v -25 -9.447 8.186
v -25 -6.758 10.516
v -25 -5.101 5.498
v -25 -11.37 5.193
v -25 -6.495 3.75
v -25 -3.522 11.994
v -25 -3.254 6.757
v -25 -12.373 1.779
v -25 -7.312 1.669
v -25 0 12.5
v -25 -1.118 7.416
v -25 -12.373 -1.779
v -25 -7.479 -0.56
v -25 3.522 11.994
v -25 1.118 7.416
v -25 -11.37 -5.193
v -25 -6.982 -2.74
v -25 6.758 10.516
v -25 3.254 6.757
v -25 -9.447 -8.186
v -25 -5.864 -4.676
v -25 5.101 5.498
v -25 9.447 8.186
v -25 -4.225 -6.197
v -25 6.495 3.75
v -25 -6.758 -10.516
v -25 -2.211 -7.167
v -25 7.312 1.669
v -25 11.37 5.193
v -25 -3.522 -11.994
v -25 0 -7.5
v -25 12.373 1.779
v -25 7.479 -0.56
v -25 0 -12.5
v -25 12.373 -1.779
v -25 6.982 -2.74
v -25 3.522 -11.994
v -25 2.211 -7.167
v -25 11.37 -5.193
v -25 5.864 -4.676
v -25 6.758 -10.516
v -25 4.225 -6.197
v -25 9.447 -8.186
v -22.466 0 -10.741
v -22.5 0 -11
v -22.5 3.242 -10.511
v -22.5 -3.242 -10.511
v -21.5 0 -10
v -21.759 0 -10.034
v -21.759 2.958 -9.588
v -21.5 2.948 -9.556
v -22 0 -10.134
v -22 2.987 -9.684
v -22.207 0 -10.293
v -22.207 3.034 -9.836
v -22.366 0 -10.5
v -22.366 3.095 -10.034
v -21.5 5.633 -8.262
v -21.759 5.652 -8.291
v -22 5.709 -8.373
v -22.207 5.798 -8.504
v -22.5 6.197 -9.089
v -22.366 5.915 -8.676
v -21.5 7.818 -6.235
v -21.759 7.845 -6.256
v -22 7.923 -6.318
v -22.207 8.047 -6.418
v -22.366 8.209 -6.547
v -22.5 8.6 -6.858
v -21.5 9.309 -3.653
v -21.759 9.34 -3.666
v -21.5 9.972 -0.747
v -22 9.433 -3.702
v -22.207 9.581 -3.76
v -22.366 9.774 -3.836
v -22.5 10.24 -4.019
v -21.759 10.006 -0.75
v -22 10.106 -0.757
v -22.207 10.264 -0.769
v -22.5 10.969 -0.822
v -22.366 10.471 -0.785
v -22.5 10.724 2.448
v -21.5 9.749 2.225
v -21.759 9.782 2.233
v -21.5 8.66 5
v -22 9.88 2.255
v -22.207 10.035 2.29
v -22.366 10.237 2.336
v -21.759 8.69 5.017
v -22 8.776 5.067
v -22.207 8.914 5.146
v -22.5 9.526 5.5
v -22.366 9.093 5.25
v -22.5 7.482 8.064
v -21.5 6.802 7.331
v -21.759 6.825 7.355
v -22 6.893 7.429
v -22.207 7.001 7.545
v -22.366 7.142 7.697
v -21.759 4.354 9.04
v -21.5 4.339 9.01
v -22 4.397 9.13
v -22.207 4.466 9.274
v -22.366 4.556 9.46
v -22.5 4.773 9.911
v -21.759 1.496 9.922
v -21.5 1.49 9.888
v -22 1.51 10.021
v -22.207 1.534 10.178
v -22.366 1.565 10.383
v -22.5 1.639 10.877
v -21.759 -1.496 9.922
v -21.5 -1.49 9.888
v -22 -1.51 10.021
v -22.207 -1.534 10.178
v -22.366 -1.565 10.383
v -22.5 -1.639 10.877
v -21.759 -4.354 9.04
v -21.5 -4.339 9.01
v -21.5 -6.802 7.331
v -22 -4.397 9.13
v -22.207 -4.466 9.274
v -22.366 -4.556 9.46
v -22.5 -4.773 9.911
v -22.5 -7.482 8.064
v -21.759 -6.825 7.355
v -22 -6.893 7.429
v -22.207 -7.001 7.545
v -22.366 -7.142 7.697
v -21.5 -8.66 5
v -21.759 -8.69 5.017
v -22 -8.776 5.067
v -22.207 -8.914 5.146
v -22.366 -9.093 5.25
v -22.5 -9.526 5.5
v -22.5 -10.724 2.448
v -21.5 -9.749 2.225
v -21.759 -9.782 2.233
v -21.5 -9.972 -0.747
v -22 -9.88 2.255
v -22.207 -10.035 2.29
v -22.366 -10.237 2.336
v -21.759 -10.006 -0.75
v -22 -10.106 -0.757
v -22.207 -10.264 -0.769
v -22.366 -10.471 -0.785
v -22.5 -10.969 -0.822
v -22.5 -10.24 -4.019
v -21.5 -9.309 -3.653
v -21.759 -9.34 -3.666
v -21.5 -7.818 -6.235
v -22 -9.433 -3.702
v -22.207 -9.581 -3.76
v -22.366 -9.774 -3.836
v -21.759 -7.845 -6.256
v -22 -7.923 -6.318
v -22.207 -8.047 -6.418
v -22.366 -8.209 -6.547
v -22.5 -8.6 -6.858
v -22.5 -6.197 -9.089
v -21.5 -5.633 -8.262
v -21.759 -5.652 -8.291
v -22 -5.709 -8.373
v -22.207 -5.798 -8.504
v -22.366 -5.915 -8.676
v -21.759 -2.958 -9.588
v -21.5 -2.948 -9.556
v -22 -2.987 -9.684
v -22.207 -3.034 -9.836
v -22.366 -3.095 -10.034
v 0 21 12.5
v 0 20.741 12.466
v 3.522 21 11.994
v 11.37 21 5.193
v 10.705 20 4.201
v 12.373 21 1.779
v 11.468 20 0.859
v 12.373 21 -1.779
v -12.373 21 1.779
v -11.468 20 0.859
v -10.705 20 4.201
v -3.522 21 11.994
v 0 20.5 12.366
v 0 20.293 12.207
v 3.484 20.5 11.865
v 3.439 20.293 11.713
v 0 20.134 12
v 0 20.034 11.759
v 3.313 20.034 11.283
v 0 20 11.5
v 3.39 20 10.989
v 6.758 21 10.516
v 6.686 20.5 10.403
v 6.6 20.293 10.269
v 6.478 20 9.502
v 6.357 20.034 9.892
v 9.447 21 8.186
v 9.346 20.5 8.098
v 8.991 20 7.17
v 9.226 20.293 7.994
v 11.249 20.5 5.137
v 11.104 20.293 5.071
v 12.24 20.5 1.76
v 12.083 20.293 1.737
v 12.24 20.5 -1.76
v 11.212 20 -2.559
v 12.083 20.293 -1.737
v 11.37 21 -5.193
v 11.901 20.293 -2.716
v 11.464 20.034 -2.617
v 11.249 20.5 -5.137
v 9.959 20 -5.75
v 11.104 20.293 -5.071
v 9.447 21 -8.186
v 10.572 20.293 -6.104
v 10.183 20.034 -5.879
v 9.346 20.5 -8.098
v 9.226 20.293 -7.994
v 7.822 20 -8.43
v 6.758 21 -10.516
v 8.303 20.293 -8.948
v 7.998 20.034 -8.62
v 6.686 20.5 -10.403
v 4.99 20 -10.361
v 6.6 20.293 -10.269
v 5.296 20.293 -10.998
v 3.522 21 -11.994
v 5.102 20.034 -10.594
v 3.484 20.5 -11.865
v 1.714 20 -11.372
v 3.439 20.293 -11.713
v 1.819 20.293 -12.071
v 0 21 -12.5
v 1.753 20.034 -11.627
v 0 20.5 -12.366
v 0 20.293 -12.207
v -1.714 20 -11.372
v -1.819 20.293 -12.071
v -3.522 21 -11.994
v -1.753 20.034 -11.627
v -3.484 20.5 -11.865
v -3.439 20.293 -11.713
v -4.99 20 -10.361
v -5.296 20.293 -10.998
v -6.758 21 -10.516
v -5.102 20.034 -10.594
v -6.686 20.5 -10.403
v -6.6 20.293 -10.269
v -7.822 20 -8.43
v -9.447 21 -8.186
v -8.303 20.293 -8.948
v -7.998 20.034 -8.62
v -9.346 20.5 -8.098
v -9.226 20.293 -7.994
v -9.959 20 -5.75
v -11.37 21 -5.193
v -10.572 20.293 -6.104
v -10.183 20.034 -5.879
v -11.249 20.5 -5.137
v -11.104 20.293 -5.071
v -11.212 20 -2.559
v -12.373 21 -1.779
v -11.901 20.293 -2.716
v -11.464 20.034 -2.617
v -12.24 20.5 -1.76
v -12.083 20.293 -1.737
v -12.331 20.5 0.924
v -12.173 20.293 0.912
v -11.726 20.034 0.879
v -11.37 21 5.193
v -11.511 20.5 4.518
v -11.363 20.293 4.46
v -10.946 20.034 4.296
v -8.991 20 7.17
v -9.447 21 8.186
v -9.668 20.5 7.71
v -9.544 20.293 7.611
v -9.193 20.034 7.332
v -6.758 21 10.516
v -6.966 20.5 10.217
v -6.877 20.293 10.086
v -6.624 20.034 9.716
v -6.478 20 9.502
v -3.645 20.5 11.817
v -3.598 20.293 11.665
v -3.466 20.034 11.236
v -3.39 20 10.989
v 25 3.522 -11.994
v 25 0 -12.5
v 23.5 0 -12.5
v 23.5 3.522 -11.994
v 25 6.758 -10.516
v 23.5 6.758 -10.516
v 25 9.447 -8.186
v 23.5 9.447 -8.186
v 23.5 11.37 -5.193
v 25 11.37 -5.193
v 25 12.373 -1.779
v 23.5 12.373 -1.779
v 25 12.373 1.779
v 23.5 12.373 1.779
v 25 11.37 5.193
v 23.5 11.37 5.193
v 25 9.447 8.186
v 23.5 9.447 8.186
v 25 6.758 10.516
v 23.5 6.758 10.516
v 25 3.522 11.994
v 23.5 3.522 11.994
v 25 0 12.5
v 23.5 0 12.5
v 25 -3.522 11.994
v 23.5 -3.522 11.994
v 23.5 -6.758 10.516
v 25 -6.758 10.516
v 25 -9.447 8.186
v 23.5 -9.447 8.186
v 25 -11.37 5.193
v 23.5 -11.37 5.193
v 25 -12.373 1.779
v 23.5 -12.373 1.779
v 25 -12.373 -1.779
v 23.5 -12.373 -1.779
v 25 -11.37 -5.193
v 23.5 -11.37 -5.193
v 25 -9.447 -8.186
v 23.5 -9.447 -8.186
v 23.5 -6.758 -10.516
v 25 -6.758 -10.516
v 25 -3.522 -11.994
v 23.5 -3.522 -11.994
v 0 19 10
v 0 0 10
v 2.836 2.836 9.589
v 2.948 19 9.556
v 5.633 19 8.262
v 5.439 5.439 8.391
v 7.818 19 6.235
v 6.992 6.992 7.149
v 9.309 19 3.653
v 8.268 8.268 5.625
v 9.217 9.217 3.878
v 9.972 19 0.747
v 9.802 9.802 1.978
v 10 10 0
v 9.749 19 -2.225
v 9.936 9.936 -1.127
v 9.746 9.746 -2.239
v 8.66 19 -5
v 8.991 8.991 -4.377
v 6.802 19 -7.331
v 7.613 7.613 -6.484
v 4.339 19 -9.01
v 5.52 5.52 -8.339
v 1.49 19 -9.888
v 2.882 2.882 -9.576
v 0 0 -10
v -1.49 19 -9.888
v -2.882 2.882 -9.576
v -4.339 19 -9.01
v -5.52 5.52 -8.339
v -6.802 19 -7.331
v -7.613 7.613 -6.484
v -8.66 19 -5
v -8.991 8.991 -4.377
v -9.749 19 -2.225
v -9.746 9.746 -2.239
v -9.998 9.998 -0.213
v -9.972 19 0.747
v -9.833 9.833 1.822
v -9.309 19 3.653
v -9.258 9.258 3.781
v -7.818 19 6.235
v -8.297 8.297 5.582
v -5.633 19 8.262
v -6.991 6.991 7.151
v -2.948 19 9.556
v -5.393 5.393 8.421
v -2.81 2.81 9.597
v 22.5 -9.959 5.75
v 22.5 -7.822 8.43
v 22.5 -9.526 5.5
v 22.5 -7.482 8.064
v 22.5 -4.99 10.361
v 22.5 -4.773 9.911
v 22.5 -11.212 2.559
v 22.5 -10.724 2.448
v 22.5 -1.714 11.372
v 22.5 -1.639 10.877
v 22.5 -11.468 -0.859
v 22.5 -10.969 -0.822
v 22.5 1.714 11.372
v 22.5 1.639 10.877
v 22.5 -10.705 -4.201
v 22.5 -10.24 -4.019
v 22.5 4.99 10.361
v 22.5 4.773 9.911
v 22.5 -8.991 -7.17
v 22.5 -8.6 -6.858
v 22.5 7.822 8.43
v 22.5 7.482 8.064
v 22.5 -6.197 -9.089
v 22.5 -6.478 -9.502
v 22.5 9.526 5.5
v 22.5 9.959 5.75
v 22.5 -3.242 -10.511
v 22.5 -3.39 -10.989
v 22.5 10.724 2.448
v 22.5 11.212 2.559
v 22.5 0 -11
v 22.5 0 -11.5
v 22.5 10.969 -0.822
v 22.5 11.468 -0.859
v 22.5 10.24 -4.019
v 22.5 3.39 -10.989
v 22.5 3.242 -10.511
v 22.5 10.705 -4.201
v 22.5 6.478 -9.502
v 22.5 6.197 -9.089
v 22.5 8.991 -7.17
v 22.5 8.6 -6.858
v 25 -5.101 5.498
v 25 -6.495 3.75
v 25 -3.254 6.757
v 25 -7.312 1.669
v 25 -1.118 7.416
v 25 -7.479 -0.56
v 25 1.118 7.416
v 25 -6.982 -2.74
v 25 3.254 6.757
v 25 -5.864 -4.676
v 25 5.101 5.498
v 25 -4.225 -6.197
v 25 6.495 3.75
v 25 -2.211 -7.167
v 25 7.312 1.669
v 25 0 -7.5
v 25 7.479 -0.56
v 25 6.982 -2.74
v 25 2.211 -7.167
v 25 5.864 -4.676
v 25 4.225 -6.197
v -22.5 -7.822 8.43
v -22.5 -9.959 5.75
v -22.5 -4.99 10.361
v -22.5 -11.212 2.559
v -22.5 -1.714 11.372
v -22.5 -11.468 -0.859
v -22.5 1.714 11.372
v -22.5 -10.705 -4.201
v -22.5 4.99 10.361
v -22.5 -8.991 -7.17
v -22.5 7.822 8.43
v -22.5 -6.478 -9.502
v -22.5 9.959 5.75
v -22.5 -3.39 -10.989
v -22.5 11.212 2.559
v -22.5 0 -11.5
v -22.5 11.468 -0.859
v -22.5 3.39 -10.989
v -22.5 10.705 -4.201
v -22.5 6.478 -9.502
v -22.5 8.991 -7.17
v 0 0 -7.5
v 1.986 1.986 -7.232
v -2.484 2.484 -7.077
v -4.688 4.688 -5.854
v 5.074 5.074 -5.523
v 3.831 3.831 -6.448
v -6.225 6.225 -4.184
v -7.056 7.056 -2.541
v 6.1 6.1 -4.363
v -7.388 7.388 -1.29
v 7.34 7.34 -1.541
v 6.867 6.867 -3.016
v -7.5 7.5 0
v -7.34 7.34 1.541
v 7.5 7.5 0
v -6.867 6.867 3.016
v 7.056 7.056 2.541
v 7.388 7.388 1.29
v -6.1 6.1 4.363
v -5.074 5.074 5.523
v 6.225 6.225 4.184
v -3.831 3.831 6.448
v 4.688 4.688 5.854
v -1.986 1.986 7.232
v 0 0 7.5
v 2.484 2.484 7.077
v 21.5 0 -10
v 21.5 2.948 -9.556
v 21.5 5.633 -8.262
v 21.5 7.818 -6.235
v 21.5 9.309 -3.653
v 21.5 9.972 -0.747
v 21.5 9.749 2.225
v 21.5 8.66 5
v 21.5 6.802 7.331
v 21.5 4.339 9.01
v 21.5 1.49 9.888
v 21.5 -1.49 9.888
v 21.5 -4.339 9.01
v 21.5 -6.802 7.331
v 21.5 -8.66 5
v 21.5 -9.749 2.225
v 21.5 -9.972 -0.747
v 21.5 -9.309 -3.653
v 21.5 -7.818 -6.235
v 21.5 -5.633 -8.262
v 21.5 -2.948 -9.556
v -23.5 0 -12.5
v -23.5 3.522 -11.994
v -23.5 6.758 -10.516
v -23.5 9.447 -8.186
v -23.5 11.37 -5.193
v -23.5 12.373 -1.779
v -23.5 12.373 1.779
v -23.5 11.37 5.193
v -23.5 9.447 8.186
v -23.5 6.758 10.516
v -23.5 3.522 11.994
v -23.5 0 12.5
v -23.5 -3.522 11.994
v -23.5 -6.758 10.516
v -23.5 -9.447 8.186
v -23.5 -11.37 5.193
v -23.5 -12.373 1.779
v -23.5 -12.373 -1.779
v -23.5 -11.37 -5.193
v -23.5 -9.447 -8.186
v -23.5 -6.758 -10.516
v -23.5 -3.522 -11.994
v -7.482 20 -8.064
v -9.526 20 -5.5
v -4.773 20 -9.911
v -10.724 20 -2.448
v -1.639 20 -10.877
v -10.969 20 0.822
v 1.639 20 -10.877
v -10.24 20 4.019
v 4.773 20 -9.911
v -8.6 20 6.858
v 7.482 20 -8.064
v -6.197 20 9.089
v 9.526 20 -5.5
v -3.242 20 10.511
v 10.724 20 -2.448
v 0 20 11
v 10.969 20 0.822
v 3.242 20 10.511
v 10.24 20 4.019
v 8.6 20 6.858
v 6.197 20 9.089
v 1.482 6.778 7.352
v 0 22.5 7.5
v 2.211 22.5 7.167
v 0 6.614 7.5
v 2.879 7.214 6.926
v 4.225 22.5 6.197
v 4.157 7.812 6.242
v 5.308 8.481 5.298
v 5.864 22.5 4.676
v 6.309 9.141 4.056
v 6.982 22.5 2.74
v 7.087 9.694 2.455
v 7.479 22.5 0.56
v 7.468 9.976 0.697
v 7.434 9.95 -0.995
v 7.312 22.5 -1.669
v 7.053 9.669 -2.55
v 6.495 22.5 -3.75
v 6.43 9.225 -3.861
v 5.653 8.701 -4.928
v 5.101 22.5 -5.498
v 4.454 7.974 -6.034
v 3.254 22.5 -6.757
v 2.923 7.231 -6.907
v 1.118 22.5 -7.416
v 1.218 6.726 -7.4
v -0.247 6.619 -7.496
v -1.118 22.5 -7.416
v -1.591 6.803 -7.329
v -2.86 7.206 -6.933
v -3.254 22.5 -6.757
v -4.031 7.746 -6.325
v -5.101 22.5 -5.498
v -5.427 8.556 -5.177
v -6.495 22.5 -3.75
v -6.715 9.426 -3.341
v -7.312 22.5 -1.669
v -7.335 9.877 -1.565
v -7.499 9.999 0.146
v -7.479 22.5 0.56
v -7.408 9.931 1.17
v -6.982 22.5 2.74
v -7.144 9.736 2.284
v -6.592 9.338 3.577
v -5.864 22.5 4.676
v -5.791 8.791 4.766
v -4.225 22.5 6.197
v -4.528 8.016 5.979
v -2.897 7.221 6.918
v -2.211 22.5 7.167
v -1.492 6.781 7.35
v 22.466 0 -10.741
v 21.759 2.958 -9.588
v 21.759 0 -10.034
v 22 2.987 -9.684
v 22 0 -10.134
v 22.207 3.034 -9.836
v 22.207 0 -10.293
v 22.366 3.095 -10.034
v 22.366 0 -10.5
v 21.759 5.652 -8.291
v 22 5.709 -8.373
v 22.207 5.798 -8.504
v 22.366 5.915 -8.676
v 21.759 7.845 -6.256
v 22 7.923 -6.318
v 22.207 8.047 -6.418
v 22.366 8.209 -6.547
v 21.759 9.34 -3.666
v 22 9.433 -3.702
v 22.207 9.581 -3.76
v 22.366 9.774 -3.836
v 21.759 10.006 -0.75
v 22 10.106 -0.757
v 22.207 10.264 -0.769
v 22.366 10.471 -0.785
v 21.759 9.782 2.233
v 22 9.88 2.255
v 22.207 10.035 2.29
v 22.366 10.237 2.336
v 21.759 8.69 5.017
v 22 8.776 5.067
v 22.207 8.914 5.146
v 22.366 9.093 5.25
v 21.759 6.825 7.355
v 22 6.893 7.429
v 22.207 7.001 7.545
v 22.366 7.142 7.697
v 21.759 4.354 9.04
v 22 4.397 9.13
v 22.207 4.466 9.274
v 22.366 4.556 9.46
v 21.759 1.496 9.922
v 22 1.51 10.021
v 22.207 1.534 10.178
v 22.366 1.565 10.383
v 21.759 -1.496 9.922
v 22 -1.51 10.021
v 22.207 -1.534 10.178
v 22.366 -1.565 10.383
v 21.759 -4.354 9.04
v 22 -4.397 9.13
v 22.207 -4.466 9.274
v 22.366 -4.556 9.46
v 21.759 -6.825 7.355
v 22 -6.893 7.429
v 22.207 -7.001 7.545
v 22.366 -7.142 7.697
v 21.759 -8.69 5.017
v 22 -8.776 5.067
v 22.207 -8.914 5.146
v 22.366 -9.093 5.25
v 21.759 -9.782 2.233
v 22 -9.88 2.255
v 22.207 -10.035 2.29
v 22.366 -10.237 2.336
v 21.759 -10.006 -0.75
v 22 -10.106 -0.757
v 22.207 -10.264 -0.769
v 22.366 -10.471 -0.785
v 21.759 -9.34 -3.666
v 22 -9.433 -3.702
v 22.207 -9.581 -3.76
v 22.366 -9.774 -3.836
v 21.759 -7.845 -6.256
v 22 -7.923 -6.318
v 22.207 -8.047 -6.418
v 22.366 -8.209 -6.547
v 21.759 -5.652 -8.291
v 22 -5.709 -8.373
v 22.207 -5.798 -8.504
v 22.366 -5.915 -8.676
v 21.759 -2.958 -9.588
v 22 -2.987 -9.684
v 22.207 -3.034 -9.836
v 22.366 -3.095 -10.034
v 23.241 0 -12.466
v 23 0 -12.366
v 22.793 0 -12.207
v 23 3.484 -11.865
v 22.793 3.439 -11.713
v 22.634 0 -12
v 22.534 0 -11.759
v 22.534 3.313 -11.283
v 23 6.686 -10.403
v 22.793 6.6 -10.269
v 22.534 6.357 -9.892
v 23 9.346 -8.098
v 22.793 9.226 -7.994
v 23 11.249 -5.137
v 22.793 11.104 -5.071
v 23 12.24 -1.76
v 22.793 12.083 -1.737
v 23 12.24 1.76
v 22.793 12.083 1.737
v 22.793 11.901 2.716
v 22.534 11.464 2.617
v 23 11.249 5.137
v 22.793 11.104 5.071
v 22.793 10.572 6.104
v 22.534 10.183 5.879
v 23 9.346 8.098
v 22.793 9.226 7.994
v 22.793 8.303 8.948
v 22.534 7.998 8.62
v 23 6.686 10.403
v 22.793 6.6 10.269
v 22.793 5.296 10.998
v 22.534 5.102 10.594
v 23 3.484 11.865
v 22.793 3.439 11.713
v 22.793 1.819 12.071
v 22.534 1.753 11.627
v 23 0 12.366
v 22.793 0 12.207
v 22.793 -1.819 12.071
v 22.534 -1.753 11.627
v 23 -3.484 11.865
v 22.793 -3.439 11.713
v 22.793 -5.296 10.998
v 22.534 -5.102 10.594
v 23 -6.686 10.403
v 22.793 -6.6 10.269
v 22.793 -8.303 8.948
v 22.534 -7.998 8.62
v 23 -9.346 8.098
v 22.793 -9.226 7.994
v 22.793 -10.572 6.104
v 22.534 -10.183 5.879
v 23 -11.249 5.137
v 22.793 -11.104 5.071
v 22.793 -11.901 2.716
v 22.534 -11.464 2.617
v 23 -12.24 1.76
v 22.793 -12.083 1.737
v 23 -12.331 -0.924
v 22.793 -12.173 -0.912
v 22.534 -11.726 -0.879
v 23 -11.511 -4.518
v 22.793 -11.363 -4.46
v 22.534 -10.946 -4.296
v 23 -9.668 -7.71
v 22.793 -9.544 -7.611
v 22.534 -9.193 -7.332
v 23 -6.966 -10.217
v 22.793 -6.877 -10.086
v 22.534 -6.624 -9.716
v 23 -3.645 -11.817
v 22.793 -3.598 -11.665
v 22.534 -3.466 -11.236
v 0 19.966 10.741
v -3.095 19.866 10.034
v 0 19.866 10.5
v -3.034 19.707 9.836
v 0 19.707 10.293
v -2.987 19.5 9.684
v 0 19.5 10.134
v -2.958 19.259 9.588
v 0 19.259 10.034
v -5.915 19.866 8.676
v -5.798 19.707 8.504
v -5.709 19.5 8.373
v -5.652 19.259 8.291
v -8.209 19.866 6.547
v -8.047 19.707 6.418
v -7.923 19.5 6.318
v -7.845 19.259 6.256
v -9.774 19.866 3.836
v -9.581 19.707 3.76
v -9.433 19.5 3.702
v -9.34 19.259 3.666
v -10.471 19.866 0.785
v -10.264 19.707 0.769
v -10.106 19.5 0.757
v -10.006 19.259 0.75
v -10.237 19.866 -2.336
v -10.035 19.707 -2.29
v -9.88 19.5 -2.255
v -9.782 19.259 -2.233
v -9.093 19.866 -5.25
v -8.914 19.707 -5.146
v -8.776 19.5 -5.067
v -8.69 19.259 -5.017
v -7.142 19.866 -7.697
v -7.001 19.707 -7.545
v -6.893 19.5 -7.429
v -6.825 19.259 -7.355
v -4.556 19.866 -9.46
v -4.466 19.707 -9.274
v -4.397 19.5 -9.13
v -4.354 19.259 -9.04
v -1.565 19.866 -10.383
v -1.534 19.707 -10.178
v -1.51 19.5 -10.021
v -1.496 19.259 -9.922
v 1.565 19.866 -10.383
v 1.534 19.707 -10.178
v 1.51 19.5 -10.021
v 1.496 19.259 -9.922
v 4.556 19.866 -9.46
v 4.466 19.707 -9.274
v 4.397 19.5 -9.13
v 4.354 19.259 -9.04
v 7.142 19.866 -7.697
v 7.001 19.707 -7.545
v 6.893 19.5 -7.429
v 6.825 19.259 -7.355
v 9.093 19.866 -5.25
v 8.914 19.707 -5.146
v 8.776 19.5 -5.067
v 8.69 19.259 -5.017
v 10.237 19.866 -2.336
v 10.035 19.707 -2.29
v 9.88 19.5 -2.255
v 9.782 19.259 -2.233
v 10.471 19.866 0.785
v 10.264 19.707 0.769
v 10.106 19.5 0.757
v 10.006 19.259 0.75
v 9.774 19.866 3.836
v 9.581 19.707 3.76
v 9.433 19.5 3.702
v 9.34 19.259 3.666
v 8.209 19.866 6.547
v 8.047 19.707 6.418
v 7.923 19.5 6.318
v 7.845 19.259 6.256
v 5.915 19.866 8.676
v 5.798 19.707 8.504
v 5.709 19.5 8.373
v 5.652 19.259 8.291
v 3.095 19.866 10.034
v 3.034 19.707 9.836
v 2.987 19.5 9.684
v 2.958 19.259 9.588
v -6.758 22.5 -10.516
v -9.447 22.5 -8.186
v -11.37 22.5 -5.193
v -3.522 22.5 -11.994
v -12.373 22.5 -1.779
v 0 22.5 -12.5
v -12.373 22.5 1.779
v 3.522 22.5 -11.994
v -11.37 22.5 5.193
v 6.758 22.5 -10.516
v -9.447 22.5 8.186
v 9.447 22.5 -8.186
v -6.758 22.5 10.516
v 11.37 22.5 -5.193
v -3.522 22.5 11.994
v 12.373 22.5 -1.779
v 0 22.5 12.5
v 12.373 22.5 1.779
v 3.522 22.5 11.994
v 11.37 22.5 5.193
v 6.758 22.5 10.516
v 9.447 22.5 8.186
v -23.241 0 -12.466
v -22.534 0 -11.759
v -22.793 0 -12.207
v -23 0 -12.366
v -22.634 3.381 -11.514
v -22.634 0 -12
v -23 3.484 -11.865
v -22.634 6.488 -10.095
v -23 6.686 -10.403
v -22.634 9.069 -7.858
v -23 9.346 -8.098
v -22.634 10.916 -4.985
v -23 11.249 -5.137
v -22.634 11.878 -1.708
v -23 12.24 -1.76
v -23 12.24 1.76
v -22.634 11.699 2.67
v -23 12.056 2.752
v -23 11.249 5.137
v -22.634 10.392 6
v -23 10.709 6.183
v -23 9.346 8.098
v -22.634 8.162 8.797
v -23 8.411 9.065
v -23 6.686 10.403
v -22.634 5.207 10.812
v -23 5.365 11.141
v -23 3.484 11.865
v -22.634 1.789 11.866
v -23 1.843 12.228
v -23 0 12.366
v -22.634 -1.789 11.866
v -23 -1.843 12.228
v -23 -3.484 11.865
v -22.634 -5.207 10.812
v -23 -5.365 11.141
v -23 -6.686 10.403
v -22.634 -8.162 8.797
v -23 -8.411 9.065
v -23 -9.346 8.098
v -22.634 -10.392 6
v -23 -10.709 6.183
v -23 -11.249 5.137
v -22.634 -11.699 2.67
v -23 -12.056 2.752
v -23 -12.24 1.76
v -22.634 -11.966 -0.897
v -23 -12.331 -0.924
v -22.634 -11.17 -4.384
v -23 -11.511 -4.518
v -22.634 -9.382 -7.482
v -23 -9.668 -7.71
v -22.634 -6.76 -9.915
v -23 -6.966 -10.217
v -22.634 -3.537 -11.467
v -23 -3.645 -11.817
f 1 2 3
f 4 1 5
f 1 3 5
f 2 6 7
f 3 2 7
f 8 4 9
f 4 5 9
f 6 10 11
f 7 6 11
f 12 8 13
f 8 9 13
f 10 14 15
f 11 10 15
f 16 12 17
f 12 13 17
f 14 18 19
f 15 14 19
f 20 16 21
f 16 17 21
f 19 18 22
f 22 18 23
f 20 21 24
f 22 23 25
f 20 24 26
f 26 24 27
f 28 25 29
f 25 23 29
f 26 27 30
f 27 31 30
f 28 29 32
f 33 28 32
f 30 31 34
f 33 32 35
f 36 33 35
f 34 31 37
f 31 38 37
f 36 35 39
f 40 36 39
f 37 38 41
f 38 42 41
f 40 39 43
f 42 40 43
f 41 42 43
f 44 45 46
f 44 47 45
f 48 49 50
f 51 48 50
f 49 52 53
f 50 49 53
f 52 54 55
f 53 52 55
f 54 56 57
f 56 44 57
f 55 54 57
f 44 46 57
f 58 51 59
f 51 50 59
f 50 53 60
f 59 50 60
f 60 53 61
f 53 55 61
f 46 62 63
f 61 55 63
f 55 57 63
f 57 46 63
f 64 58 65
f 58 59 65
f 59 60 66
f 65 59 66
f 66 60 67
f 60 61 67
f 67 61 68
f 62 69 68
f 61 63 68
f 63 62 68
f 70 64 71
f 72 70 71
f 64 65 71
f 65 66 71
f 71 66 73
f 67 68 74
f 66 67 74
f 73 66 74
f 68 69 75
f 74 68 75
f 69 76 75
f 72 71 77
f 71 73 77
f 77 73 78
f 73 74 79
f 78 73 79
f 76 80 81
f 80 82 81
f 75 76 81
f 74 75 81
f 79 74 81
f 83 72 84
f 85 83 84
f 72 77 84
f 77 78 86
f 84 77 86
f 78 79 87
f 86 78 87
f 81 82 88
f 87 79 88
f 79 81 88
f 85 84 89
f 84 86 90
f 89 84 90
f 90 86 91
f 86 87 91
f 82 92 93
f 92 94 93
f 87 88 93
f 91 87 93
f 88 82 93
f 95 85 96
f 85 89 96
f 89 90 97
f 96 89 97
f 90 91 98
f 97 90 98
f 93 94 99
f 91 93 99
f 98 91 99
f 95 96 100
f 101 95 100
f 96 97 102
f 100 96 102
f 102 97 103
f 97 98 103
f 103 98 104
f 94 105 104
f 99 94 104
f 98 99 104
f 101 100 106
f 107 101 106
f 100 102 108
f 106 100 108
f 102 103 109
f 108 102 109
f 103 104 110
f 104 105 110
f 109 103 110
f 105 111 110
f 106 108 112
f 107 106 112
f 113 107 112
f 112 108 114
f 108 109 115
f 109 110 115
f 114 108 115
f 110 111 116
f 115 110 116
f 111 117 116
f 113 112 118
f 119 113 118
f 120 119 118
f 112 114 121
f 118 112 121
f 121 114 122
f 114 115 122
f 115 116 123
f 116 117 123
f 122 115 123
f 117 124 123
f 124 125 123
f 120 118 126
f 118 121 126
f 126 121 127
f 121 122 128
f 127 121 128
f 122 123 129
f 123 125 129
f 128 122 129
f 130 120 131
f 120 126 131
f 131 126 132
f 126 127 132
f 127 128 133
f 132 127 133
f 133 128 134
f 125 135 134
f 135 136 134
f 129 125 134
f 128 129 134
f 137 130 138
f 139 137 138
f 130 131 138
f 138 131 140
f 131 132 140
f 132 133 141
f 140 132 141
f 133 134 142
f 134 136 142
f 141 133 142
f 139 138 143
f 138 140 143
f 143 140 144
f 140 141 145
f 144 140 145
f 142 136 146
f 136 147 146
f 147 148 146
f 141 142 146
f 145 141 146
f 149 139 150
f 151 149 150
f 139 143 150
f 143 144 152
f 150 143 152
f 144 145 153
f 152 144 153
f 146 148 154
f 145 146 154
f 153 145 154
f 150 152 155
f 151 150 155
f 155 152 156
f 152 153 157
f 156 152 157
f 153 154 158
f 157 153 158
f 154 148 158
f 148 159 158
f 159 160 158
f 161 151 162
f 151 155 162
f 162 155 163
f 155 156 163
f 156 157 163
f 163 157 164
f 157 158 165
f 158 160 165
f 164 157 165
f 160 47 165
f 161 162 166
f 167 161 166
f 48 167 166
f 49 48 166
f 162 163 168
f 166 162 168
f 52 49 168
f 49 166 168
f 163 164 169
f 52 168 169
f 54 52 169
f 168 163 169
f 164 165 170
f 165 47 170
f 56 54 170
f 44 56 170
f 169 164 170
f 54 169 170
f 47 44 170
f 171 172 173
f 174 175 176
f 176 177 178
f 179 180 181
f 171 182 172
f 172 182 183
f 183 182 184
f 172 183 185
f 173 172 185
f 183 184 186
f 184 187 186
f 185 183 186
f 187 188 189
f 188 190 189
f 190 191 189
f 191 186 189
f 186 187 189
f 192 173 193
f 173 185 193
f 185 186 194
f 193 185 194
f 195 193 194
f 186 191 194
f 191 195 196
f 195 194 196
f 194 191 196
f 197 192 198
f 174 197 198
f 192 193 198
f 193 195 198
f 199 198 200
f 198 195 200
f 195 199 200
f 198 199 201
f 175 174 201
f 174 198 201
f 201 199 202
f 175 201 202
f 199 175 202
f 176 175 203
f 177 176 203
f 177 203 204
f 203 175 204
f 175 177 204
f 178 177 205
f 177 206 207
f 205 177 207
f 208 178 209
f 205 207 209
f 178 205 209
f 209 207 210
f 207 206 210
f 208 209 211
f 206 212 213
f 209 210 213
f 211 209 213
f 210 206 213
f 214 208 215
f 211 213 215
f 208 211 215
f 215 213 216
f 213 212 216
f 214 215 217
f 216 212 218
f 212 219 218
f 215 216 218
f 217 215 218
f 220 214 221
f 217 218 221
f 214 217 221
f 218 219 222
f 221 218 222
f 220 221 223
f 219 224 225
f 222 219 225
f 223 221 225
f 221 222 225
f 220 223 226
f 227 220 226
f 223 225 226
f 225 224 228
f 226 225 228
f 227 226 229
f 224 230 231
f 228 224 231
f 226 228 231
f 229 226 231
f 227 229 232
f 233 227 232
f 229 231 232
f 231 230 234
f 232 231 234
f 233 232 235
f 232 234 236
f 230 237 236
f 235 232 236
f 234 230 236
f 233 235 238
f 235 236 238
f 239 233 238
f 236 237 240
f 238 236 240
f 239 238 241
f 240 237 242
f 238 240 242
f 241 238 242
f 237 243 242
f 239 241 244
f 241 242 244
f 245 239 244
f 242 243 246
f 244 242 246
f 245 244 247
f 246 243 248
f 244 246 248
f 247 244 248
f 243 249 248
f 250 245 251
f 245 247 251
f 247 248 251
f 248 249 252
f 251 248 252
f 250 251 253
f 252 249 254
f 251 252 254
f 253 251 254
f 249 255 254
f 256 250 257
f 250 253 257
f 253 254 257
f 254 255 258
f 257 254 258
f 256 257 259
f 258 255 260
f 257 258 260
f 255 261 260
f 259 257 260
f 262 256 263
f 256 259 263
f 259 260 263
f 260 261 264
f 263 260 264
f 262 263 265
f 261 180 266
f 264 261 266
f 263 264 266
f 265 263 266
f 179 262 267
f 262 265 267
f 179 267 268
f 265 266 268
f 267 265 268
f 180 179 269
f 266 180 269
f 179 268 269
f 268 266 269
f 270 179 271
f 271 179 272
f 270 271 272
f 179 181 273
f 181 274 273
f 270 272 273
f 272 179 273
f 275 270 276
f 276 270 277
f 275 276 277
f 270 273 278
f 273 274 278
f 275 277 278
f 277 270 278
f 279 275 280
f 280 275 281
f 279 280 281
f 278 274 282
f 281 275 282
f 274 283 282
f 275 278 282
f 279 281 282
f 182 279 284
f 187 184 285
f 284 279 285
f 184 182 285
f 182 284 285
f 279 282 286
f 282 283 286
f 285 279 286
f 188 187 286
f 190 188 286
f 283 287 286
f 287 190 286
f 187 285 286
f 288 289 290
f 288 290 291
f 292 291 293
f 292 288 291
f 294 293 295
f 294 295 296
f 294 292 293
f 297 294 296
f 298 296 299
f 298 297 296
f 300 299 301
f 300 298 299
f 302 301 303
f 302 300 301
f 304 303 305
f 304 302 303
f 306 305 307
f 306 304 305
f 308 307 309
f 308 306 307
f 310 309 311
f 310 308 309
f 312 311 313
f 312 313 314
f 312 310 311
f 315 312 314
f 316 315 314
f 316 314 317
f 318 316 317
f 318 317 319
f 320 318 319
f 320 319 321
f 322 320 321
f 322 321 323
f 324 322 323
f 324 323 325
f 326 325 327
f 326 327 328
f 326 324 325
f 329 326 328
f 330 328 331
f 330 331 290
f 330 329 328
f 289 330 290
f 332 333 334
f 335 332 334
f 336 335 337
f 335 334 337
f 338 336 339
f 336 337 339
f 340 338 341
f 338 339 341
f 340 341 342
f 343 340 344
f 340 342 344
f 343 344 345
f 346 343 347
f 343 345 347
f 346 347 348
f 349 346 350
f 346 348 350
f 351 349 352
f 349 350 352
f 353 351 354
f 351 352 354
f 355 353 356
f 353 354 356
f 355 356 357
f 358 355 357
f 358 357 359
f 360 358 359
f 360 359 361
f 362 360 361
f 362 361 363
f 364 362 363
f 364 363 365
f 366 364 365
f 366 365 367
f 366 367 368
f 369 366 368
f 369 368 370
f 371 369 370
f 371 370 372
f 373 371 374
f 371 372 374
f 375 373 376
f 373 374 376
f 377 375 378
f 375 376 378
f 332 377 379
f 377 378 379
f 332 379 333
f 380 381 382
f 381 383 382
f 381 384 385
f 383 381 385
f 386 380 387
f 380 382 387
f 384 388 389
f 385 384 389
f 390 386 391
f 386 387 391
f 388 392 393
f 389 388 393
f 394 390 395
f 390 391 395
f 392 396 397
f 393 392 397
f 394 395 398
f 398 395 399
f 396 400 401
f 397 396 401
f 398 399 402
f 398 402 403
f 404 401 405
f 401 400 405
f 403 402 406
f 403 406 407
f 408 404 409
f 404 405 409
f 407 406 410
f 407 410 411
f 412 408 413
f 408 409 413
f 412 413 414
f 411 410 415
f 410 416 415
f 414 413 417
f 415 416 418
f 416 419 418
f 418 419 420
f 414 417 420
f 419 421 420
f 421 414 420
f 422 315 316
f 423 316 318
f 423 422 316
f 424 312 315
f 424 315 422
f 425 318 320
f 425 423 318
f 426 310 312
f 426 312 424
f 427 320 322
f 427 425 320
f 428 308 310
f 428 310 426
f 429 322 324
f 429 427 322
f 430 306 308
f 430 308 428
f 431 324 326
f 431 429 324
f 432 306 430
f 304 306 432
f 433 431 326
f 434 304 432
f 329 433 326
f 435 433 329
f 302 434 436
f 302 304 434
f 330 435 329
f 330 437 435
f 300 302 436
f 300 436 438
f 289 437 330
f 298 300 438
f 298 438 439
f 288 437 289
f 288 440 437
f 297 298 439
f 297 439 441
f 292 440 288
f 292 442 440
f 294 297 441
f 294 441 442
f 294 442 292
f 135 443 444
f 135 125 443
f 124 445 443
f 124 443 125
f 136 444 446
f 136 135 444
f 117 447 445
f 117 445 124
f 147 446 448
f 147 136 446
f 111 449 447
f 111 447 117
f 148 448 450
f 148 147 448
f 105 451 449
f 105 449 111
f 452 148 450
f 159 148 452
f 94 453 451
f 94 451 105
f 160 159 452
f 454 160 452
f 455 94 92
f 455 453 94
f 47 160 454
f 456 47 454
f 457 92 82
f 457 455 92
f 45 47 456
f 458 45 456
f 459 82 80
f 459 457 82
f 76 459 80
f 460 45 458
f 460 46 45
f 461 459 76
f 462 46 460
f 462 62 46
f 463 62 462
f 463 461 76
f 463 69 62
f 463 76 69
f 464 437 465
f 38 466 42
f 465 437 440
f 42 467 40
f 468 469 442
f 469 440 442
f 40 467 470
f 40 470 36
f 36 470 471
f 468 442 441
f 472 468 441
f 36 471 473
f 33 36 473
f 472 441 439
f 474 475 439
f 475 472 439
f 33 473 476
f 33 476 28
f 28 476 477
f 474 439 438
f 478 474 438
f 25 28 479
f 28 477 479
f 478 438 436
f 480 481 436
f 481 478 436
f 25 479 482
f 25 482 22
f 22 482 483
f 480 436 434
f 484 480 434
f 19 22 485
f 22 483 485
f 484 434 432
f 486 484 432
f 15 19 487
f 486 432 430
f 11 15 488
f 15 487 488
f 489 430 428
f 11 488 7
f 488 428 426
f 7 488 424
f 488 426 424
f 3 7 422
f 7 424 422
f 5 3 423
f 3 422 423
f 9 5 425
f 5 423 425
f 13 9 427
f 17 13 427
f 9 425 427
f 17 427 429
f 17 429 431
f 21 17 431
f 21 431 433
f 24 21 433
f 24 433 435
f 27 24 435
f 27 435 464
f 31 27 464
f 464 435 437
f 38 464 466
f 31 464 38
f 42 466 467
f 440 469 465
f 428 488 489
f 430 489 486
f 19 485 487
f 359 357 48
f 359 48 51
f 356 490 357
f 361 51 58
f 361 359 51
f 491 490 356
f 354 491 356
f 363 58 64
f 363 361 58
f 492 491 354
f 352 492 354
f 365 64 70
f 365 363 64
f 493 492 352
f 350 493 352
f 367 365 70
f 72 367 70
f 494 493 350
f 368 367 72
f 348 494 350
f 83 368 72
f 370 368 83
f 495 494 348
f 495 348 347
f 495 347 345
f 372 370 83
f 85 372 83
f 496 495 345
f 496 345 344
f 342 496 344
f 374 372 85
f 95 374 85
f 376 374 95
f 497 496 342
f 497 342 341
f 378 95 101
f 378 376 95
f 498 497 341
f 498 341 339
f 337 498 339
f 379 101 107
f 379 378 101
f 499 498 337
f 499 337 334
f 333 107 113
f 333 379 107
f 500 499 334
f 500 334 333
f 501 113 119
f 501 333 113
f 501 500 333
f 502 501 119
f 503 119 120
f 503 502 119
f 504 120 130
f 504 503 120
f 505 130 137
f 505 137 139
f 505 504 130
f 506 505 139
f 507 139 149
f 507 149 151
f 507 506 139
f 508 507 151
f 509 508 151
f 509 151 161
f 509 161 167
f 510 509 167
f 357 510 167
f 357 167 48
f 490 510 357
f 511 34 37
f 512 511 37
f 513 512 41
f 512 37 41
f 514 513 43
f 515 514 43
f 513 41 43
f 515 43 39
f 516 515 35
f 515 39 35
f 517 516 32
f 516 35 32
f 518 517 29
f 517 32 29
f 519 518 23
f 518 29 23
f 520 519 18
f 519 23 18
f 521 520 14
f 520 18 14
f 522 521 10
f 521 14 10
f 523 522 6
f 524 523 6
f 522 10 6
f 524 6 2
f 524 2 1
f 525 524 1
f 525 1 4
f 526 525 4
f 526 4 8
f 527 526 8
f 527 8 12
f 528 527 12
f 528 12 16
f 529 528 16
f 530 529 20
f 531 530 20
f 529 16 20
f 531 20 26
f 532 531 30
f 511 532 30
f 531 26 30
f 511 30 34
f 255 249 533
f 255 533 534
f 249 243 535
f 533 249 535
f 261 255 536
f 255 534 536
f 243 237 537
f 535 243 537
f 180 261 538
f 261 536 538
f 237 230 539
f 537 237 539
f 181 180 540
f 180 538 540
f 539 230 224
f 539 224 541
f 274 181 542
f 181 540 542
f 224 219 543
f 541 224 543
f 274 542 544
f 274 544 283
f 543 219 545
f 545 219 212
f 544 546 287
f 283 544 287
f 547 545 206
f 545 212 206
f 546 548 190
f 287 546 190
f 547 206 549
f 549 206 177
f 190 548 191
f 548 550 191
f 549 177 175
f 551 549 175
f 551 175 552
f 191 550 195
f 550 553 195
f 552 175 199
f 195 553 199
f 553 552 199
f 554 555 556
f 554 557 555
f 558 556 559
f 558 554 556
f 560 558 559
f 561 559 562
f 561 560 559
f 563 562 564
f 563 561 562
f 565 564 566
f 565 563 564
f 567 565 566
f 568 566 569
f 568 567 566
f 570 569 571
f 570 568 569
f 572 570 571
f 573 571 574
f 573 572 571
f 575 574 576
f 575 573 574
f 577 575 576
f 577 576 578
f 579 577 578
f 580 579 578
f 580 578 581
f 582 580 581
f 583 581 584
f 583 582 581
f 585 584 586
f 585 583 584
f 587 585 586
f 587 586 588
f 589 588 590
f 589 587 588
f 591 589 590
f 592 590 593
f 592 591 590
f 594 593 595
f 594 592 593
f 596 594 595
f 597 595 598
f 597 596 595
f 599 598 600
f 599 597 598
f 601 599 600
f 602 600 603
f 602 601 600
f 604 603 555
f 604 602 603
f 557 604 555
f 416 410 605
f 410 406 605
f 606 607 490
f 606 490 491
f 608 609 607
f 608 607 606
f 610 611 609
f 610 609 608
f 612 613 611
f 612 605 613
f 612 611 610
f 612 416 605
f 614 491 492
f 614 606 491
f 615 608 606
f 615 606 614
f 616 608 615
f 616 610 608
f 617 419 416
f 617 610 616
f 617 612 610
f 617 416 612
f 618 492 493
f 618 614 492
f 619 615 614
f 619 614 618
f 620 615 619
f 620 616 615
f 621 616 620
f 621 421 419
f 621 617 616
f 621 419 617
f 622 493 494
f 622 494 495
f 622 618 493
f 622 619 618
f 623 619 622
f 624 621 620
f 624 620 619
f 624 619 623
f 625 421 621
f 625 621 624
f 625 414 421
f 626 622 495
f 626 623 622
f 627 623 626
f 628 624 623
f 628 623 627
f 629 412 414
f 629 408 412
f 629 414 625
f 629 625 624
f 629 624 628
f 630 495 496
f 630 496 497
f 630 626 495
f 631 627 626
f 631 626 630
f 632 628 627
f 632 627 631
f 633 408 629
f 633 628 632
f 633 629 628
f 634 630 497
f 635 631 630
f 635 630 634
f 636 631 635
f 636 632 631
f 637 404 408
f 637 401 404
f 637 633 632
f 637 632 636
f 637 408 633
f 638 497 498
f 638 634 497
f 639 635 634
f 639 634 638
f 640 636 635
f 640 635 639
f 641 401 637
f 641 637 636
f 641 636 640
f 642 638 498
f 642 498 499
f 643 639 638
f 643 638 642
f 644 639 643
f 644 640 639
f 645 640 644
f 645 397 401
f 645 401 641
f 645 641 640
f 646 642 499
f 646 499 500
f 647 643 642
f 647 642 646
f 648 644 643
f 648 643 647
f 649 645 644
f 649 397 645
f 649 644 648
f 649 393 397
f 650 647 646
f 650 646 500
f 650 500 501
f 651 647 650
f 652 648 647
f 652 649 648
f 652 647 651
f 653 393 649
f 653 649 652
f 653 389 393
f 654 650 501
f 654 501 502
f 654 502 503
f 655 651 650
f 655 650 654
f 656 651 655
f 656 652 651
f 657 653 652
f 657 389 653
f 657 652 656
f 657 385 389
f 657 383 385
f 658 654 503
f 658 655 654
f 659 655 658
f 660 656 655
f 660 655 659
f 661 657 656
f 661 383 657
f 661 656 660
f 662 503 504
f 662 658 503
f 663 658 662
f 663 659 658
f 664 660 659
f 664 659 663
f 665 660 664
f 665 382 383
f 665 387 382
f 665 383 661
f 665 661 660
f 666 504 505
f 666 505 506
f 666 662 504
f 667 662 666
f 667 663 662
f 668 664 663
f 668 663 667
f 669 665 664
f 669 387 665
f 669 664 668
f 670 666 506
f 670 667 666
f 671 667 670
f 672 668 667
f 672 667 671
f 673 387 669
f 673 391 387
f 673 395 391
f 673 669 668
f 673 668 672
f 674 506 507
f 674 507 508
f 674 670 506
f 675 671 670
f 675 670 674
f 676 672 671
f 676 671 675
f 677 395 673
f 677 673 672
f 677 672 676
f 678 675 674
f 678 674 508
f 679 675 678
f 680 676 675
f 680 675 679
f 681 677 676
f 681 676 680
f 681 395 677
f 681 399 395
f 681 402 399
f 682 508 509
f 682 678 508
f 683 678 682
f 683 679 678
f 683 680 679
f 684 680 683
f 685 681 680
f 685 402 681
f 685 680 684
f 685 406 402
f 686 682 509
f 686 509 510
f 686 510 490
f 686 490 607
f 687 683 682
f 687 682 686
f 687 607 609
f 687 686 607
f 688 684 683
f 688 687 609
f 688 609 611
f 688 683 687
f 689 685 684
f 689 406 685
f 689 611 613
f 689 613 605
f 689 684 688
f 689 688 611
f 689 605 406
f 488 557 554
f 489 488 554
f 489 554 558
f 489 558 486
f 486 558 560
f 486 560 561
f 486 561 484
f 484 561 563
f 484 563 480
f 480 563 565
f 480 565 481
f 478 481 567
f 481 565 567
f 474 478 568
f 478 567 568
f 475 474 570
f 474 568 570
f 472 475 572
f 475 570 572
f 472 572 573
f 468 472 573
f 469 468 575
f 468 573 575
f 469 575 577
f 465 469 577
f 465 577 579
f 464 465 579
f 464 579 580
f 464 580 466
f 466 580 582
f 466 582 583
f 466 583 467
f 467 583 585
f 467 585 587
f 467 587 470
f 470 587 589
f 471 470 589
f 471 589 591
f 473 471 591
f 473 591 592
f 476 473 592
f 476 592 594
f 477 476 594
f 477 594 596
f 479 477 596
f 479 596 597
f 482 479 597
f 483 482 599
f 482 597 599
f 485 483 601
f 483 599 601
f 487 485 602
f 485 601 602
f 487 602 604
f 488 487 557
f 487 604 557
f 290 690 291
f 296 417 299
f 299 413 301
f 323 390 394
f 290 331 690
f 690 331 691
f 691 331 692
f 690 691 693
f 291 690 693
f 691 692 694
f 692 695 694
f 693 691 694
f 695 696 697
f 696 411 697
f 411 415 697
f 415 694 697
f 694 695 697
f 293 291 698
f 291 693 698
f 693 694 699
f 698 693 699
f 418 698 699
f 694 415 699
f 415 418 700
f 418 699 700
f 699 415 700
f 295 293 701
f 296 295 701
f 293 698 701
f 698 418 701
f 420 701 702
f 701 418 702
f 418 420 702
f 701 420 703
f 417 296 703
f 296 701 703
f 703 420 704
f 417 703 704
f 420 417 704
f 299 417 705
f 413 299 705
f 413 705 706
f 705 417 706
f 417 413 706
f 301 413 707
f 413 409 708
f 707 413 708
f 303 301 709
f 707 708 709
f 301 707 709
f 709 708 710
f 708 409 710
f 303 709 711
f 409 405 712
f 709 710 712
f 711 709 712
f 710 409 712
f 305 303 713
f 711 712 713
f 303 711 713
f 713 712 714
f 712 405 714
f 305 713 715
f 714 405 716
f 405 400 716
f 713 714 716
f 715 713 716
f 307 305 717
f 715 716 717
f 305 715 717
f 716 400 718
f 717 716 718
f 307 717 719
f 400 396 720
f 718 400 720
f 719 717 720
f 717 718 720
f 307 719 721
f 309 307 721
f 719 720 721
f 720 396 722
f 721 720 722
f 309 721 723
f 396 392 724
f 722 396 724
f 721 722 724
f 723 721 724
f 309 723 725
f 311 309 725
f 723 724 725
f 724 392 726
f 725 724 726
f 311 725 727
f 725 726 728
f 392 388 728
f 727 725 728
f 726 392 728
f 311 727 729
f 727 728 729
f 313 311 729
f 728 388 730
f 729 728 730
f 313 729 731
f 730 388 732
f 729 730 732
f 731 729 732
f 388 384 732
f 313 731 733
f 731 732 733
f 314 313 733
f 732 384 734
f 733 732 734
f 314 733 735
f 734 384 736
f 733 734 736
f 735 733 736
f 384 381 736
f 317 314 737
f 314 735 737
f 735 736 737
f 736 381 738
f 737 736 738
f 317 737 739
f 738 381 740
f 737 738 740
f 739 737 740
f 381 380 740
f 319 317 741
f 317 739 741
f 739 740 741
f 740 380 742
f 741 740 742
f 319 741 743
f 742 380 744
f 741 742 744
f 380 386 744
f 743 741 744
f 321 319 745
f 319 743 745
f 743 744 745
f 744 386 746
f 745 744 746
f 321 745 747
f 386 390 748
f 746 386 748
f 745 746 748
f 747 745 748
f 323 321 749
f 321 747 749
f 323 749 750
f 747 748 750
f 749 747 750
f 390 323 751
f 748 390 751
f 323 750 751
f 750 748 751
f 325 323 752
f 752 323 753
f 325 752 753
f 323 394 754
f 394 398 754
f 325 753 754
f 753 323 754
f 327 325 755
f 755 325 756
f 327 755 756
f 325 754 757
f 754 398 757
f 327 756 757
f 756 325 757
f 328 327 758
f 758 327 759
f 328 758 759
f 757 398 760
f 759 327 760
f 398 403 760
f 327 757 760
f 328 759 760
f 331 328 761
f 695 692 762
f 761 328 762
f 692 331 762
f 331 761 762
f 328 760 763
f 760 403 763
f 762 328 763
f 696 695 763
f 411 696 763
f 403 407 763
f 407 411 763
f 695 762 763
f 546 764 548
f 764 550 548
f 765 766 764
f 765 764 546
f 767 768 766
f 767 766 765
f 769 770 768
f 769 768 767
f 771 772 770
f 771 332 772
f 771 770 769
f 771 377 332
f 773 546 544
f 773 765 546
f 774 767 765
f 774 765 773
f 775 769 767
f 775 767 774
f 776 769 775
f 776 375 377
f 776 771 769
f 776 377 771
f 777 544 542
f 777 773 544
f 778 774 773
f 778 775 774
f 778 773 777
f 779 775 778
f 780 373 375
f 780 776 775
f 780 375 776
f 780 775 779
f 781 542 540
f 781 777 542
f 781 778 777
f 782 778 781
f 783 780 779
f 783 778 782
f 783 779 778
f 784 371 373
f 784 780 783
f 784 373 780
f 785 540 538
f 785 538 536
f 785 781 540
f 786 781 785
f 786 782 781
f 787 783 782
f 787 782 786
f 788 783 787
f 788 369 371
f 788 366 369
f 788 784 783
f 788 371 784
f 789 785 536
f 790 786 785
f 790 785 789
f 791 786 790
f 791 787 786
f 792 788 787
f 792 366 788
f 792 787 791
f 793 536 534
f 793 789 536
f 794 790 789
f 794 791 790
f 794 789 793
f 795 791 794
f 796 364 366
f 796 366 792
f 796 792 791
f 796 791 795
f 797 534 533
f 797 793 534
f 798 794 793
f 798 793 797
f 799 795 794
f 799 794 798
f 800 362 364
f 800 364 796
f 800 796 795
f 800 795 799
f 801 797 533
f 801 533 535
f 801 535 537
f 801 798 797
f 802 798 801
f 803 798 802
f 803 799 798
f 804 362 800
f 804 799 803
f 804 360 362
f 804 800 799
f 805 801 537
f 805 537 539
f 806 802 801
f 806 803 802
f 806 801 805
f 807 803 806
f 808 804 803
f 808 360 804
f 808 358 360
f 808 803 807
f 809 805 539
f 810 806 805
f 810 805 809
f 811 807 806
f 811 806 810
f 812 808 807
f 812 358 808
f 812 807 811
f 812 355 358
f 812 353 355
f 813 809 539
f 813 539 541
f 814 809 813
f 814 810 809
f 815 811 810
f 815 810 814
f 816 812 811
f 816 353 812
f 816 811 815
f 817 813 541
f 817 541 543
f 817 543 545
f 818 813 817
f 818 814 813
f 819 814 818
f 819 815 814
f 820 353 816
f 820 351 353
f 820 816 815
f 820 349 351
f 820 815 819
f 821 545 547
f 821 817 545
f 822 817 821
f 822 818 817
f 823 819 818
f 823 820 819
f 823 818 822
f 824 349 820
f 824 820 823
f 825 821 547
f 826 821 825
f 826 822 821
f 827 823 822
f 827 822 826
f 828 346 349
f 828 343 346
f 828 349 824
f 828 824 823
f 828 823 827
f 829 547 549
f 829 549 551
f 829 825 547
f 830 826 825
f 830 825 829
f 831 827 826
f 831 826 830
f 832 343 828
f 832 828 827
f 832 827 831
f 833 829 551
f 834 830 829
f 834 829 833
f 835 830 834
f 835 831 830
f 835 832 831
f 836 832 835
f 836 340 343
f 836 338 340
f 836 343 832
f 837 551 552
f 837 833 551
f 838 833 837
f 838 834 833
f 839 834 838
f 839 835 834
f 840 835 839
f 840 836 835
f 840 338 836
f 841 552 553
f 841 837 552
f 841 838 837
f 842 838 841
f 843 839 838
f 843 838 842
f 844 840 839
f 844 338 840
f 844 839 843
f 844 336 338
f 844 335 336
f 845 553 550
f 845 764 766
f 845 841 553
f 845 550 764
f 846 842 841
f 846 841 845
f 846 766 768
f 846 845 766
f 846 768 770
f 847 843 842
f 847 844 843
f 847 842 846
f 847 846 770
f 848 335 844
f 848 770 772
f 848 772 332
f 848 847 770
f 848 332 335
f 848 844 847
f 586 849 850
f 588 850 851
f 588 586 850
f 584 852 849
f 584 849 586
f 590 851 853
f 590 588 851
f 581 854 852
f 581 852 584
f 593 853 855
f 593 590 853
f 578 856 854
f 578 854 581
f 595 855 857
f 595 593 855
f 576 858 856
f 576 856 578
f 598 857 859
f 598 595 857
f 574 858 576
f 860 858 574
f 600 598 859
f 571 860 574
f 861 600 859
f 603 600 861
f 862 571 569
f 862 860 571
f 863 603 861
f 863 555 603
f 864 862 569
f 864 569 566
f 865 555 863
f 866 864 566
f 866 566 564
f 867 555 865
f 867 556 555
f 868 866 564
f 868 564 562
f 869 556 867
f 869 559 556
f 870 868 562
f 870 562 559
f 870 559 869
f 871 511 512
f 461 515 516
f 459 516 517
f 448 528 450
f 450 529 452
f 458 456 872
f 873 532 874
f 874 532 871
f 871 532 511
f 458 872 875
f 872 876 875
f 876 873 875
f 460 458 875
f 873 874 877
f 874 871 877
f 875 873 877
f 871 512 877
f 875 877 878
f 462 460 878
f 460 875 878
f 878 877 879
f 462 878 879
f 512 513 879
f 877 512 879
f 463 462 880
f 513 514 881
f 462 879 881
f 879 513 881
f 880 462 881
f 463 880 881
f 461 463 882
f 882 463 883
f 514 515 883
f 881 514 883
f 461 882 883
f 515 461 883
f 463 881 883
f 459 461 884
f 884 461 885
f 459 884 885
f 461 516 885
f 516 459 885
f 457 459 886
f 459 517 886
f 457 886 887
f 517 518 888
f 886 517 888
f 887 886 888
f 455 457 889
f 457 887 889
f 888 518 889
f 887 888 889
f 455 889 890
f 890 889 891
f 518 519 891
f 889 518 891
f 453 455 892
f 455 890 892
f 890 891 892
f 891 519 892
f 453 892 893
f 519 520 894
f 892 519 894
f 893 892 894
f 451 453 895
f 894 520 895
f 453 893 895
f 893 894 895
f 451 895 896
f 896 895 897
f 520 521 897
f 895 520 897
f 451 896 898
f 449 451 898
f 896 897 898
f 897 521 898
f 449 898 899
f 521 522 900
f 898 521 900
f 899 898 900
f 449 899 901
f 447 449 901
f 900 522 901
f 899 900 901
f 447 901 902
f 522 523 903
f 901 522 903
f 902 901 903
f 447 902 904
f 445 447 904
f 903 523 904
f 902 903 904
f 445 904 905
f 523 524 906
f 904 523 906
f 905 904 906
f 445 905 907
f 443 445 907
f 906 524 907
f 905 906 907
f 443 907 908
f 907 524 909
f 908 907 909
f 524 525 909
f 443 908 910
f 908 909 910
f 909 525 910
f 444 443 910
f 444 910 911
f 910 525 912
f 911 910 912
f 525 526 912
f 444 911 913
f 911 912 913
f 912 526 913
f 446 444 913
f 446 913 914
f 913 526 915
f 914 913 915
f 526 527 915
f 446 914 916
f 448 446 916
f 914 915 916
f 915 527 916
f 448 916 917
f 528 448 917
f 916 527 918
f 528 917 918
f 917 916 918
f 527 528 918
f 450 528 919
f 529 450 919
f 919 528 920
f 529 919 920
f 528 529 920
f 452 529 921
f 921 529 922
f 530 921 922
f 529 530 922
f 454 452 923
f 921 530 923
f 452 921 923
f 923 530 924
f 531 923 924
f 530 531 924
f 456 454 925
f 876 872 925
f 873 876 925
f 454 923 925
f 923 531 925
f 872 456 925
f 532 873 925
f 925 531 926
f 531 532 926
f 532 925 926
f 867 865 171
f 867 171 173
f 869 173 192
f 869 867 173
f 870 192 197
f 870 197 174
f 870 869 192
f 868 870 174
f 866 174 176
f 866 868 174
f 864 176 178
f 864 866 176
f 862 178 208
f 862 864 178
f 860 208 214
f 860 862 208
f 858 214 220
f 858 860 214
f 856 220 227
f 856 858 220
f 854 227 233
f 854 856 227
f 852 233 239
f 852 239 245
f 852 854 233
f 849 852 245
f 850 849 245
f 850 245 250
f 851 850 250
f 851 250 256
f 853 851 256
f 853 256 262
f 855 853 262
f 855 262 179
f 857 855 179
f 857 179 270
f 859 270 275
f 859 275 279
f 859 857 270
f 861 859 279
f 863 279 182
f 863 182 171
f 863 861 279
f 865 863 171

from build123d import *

# Parameters (mm, degrees)
SKETCH2_R                = 10
SKETCH2_R_2              = 7.5
SKETCH3_R                = 12.5
SKETCH3_R_2              = 7.5
BOSS_EXTRUDE1_DEPTH      = 2.5
BOSS_EXTRUDE2_DEPTH      = 15
BOSS_EXTRUDE2_DEPTH_BACK = 7.5
SKETCH4_R                = 10
SKETCH4_R_2              = 7.5
SKETCH5_R                = 7.5
CUT_EXTRUDE1_DEPTH       = 57.236109525
CUT_EXTRUDE2_REACH       = 46.791
SKETCH6_R                = 7.5
SKETCH7_R                = 12.5
SKETCH7_R_2              = 7.5
BOSS_EXTRUDE3_DEPTH      = 2.5
FILLET1_R                = 1


with BuildPart() as part:
    # Sweep-Thin1: sweep along a path in Sketch1
    with BuildLine(Plane.XY) as sweep_thin1_path:
        Line((-25, 0), (0, 0))
        Line((0, 0), (25, 0))
    # Sketch2 → Sweep-Thin1 (sweep)
    with BuildSketch(Plane(origin=(0, 0, 0), x_dir=(0, 0, -1), z_dir=(1, 0, 0))):
        Circle(SKETCH2_R)
        Circle(SKETCH2_R_2, mode=Mode.SUBTRACT)
    sweep(path=sweep_thin1_path.line)

    # Sketch3 → Boss-Extrude1 (add)
    with BuildSketch(Plane(origin=(25, 0, 0), x_dir=(0, 0, -1), z_dir=(1, 0, 0))):
        Circle(SKETCH3_R)
        Circle(SKETCH3_R_2, mode=Mode.SUBTRACT)
    extrude(amount=-BOSS_EXTRUDE1_DEPTH)

    # Mirror1: part across plane


with BuildPart() as part_1:
    add(part.part)
    add(part.part.mirror(Plane(origin=(0, 0, 0), x_dir=(0, 0, 1), z_dir=(1, 0, 0))))

    # Sketch4 → Boss-Extrude2 (add, two sides: drawn at the far end of the back side and taken through both)
    with BuildSketch(Plane(origin=(0, 7.5, 0), x_dir=(1, 0, 0), z_dir=(0, 1, 0)).offset(-BOSS_EXTRUDE2_DEPTH_BACK)):
        with Locations(Location((0, 0, 0), (0, 0, 270))):
            Circle(SKETCH4_R)
        with Locations(Location((0, 0, 0), (0, 0, 270))):
            Circle(SKETCH4_R_2, mode=Mode.SUBTRACT)
    extrude(amount=BOSS_EXTRUDE2_DEPTH + BOSS_EXTRUDE2_DEPTH_BACK)

    # Sketch5 → Cut-Extrude1 (cut, through all)
    with BuildSketch(Plane(origin=(25, 0, 0), x_dir=(0, 0, -1), z_dir=(1, 0, 0))):
        Circle(SKETCH5_R)
    extrude(amount=-CUT_EXTRUDE1_DEPTH, mode=Mode.SUBTRACT)

    # Sketch6 → Cut-Extrude2 (cut, up to next)
    with BuildSketch(Plane(origin=(0, 22.5, 0), x_dir=(1, 0, 0), z_dir=(0, 1, 0)), mode=Mode.PRIVATE) as cut_extrude2_sk1:
        with Locations(Location((0, 0, 0), (0, 0, 270))):
            Circle(SKETCH6_R)
    cut_extrude2_tool1 = extrude(cut_extrude2_sk1.sketch, amount=-CUT_EXTRUDE2_REACH, mode=Mode.PRIVATE) & part_1.part
    add(cut_extrude2_tool1.solids().sort_by_distance((0, 22.5, 0))[0], mode=Mode.SUBTRACT)

    # Sketch7 → Boss-Extrude3 (add)
    with BuildSketch(Plane(origin=(0, 22.5, 0), x_dir=(1, 0, 0), z_dir=(0, 1, 0))):
        with Locations(Location((0, 0, 0), (0, 0, 270))):
            Circle(SKETCH7_R)
        with Locations(Location((0, 0, 0), (0, 0, 270))):
            Circle(SKETCH7_R_2, mode=Mode.SUBTRACT)
    extrude(amount=-BOSS_EXTRUDE3_DEPTH)

    # Fillet1
    fillet1_edges = [part_1.edges().sort_by_distance(p)[0] for p in [
        (22.5, 0, 10),
        (22.5, 0, 12.5),
        (-22.5, 0, 10),
        (-22.5, 0, 12.5),
        (0, 20, -10),
        (0, 20, -12.5),
    ]]
    fillet(fillet1_edges, radius=FILLET1_R)


solid = part_1.part
